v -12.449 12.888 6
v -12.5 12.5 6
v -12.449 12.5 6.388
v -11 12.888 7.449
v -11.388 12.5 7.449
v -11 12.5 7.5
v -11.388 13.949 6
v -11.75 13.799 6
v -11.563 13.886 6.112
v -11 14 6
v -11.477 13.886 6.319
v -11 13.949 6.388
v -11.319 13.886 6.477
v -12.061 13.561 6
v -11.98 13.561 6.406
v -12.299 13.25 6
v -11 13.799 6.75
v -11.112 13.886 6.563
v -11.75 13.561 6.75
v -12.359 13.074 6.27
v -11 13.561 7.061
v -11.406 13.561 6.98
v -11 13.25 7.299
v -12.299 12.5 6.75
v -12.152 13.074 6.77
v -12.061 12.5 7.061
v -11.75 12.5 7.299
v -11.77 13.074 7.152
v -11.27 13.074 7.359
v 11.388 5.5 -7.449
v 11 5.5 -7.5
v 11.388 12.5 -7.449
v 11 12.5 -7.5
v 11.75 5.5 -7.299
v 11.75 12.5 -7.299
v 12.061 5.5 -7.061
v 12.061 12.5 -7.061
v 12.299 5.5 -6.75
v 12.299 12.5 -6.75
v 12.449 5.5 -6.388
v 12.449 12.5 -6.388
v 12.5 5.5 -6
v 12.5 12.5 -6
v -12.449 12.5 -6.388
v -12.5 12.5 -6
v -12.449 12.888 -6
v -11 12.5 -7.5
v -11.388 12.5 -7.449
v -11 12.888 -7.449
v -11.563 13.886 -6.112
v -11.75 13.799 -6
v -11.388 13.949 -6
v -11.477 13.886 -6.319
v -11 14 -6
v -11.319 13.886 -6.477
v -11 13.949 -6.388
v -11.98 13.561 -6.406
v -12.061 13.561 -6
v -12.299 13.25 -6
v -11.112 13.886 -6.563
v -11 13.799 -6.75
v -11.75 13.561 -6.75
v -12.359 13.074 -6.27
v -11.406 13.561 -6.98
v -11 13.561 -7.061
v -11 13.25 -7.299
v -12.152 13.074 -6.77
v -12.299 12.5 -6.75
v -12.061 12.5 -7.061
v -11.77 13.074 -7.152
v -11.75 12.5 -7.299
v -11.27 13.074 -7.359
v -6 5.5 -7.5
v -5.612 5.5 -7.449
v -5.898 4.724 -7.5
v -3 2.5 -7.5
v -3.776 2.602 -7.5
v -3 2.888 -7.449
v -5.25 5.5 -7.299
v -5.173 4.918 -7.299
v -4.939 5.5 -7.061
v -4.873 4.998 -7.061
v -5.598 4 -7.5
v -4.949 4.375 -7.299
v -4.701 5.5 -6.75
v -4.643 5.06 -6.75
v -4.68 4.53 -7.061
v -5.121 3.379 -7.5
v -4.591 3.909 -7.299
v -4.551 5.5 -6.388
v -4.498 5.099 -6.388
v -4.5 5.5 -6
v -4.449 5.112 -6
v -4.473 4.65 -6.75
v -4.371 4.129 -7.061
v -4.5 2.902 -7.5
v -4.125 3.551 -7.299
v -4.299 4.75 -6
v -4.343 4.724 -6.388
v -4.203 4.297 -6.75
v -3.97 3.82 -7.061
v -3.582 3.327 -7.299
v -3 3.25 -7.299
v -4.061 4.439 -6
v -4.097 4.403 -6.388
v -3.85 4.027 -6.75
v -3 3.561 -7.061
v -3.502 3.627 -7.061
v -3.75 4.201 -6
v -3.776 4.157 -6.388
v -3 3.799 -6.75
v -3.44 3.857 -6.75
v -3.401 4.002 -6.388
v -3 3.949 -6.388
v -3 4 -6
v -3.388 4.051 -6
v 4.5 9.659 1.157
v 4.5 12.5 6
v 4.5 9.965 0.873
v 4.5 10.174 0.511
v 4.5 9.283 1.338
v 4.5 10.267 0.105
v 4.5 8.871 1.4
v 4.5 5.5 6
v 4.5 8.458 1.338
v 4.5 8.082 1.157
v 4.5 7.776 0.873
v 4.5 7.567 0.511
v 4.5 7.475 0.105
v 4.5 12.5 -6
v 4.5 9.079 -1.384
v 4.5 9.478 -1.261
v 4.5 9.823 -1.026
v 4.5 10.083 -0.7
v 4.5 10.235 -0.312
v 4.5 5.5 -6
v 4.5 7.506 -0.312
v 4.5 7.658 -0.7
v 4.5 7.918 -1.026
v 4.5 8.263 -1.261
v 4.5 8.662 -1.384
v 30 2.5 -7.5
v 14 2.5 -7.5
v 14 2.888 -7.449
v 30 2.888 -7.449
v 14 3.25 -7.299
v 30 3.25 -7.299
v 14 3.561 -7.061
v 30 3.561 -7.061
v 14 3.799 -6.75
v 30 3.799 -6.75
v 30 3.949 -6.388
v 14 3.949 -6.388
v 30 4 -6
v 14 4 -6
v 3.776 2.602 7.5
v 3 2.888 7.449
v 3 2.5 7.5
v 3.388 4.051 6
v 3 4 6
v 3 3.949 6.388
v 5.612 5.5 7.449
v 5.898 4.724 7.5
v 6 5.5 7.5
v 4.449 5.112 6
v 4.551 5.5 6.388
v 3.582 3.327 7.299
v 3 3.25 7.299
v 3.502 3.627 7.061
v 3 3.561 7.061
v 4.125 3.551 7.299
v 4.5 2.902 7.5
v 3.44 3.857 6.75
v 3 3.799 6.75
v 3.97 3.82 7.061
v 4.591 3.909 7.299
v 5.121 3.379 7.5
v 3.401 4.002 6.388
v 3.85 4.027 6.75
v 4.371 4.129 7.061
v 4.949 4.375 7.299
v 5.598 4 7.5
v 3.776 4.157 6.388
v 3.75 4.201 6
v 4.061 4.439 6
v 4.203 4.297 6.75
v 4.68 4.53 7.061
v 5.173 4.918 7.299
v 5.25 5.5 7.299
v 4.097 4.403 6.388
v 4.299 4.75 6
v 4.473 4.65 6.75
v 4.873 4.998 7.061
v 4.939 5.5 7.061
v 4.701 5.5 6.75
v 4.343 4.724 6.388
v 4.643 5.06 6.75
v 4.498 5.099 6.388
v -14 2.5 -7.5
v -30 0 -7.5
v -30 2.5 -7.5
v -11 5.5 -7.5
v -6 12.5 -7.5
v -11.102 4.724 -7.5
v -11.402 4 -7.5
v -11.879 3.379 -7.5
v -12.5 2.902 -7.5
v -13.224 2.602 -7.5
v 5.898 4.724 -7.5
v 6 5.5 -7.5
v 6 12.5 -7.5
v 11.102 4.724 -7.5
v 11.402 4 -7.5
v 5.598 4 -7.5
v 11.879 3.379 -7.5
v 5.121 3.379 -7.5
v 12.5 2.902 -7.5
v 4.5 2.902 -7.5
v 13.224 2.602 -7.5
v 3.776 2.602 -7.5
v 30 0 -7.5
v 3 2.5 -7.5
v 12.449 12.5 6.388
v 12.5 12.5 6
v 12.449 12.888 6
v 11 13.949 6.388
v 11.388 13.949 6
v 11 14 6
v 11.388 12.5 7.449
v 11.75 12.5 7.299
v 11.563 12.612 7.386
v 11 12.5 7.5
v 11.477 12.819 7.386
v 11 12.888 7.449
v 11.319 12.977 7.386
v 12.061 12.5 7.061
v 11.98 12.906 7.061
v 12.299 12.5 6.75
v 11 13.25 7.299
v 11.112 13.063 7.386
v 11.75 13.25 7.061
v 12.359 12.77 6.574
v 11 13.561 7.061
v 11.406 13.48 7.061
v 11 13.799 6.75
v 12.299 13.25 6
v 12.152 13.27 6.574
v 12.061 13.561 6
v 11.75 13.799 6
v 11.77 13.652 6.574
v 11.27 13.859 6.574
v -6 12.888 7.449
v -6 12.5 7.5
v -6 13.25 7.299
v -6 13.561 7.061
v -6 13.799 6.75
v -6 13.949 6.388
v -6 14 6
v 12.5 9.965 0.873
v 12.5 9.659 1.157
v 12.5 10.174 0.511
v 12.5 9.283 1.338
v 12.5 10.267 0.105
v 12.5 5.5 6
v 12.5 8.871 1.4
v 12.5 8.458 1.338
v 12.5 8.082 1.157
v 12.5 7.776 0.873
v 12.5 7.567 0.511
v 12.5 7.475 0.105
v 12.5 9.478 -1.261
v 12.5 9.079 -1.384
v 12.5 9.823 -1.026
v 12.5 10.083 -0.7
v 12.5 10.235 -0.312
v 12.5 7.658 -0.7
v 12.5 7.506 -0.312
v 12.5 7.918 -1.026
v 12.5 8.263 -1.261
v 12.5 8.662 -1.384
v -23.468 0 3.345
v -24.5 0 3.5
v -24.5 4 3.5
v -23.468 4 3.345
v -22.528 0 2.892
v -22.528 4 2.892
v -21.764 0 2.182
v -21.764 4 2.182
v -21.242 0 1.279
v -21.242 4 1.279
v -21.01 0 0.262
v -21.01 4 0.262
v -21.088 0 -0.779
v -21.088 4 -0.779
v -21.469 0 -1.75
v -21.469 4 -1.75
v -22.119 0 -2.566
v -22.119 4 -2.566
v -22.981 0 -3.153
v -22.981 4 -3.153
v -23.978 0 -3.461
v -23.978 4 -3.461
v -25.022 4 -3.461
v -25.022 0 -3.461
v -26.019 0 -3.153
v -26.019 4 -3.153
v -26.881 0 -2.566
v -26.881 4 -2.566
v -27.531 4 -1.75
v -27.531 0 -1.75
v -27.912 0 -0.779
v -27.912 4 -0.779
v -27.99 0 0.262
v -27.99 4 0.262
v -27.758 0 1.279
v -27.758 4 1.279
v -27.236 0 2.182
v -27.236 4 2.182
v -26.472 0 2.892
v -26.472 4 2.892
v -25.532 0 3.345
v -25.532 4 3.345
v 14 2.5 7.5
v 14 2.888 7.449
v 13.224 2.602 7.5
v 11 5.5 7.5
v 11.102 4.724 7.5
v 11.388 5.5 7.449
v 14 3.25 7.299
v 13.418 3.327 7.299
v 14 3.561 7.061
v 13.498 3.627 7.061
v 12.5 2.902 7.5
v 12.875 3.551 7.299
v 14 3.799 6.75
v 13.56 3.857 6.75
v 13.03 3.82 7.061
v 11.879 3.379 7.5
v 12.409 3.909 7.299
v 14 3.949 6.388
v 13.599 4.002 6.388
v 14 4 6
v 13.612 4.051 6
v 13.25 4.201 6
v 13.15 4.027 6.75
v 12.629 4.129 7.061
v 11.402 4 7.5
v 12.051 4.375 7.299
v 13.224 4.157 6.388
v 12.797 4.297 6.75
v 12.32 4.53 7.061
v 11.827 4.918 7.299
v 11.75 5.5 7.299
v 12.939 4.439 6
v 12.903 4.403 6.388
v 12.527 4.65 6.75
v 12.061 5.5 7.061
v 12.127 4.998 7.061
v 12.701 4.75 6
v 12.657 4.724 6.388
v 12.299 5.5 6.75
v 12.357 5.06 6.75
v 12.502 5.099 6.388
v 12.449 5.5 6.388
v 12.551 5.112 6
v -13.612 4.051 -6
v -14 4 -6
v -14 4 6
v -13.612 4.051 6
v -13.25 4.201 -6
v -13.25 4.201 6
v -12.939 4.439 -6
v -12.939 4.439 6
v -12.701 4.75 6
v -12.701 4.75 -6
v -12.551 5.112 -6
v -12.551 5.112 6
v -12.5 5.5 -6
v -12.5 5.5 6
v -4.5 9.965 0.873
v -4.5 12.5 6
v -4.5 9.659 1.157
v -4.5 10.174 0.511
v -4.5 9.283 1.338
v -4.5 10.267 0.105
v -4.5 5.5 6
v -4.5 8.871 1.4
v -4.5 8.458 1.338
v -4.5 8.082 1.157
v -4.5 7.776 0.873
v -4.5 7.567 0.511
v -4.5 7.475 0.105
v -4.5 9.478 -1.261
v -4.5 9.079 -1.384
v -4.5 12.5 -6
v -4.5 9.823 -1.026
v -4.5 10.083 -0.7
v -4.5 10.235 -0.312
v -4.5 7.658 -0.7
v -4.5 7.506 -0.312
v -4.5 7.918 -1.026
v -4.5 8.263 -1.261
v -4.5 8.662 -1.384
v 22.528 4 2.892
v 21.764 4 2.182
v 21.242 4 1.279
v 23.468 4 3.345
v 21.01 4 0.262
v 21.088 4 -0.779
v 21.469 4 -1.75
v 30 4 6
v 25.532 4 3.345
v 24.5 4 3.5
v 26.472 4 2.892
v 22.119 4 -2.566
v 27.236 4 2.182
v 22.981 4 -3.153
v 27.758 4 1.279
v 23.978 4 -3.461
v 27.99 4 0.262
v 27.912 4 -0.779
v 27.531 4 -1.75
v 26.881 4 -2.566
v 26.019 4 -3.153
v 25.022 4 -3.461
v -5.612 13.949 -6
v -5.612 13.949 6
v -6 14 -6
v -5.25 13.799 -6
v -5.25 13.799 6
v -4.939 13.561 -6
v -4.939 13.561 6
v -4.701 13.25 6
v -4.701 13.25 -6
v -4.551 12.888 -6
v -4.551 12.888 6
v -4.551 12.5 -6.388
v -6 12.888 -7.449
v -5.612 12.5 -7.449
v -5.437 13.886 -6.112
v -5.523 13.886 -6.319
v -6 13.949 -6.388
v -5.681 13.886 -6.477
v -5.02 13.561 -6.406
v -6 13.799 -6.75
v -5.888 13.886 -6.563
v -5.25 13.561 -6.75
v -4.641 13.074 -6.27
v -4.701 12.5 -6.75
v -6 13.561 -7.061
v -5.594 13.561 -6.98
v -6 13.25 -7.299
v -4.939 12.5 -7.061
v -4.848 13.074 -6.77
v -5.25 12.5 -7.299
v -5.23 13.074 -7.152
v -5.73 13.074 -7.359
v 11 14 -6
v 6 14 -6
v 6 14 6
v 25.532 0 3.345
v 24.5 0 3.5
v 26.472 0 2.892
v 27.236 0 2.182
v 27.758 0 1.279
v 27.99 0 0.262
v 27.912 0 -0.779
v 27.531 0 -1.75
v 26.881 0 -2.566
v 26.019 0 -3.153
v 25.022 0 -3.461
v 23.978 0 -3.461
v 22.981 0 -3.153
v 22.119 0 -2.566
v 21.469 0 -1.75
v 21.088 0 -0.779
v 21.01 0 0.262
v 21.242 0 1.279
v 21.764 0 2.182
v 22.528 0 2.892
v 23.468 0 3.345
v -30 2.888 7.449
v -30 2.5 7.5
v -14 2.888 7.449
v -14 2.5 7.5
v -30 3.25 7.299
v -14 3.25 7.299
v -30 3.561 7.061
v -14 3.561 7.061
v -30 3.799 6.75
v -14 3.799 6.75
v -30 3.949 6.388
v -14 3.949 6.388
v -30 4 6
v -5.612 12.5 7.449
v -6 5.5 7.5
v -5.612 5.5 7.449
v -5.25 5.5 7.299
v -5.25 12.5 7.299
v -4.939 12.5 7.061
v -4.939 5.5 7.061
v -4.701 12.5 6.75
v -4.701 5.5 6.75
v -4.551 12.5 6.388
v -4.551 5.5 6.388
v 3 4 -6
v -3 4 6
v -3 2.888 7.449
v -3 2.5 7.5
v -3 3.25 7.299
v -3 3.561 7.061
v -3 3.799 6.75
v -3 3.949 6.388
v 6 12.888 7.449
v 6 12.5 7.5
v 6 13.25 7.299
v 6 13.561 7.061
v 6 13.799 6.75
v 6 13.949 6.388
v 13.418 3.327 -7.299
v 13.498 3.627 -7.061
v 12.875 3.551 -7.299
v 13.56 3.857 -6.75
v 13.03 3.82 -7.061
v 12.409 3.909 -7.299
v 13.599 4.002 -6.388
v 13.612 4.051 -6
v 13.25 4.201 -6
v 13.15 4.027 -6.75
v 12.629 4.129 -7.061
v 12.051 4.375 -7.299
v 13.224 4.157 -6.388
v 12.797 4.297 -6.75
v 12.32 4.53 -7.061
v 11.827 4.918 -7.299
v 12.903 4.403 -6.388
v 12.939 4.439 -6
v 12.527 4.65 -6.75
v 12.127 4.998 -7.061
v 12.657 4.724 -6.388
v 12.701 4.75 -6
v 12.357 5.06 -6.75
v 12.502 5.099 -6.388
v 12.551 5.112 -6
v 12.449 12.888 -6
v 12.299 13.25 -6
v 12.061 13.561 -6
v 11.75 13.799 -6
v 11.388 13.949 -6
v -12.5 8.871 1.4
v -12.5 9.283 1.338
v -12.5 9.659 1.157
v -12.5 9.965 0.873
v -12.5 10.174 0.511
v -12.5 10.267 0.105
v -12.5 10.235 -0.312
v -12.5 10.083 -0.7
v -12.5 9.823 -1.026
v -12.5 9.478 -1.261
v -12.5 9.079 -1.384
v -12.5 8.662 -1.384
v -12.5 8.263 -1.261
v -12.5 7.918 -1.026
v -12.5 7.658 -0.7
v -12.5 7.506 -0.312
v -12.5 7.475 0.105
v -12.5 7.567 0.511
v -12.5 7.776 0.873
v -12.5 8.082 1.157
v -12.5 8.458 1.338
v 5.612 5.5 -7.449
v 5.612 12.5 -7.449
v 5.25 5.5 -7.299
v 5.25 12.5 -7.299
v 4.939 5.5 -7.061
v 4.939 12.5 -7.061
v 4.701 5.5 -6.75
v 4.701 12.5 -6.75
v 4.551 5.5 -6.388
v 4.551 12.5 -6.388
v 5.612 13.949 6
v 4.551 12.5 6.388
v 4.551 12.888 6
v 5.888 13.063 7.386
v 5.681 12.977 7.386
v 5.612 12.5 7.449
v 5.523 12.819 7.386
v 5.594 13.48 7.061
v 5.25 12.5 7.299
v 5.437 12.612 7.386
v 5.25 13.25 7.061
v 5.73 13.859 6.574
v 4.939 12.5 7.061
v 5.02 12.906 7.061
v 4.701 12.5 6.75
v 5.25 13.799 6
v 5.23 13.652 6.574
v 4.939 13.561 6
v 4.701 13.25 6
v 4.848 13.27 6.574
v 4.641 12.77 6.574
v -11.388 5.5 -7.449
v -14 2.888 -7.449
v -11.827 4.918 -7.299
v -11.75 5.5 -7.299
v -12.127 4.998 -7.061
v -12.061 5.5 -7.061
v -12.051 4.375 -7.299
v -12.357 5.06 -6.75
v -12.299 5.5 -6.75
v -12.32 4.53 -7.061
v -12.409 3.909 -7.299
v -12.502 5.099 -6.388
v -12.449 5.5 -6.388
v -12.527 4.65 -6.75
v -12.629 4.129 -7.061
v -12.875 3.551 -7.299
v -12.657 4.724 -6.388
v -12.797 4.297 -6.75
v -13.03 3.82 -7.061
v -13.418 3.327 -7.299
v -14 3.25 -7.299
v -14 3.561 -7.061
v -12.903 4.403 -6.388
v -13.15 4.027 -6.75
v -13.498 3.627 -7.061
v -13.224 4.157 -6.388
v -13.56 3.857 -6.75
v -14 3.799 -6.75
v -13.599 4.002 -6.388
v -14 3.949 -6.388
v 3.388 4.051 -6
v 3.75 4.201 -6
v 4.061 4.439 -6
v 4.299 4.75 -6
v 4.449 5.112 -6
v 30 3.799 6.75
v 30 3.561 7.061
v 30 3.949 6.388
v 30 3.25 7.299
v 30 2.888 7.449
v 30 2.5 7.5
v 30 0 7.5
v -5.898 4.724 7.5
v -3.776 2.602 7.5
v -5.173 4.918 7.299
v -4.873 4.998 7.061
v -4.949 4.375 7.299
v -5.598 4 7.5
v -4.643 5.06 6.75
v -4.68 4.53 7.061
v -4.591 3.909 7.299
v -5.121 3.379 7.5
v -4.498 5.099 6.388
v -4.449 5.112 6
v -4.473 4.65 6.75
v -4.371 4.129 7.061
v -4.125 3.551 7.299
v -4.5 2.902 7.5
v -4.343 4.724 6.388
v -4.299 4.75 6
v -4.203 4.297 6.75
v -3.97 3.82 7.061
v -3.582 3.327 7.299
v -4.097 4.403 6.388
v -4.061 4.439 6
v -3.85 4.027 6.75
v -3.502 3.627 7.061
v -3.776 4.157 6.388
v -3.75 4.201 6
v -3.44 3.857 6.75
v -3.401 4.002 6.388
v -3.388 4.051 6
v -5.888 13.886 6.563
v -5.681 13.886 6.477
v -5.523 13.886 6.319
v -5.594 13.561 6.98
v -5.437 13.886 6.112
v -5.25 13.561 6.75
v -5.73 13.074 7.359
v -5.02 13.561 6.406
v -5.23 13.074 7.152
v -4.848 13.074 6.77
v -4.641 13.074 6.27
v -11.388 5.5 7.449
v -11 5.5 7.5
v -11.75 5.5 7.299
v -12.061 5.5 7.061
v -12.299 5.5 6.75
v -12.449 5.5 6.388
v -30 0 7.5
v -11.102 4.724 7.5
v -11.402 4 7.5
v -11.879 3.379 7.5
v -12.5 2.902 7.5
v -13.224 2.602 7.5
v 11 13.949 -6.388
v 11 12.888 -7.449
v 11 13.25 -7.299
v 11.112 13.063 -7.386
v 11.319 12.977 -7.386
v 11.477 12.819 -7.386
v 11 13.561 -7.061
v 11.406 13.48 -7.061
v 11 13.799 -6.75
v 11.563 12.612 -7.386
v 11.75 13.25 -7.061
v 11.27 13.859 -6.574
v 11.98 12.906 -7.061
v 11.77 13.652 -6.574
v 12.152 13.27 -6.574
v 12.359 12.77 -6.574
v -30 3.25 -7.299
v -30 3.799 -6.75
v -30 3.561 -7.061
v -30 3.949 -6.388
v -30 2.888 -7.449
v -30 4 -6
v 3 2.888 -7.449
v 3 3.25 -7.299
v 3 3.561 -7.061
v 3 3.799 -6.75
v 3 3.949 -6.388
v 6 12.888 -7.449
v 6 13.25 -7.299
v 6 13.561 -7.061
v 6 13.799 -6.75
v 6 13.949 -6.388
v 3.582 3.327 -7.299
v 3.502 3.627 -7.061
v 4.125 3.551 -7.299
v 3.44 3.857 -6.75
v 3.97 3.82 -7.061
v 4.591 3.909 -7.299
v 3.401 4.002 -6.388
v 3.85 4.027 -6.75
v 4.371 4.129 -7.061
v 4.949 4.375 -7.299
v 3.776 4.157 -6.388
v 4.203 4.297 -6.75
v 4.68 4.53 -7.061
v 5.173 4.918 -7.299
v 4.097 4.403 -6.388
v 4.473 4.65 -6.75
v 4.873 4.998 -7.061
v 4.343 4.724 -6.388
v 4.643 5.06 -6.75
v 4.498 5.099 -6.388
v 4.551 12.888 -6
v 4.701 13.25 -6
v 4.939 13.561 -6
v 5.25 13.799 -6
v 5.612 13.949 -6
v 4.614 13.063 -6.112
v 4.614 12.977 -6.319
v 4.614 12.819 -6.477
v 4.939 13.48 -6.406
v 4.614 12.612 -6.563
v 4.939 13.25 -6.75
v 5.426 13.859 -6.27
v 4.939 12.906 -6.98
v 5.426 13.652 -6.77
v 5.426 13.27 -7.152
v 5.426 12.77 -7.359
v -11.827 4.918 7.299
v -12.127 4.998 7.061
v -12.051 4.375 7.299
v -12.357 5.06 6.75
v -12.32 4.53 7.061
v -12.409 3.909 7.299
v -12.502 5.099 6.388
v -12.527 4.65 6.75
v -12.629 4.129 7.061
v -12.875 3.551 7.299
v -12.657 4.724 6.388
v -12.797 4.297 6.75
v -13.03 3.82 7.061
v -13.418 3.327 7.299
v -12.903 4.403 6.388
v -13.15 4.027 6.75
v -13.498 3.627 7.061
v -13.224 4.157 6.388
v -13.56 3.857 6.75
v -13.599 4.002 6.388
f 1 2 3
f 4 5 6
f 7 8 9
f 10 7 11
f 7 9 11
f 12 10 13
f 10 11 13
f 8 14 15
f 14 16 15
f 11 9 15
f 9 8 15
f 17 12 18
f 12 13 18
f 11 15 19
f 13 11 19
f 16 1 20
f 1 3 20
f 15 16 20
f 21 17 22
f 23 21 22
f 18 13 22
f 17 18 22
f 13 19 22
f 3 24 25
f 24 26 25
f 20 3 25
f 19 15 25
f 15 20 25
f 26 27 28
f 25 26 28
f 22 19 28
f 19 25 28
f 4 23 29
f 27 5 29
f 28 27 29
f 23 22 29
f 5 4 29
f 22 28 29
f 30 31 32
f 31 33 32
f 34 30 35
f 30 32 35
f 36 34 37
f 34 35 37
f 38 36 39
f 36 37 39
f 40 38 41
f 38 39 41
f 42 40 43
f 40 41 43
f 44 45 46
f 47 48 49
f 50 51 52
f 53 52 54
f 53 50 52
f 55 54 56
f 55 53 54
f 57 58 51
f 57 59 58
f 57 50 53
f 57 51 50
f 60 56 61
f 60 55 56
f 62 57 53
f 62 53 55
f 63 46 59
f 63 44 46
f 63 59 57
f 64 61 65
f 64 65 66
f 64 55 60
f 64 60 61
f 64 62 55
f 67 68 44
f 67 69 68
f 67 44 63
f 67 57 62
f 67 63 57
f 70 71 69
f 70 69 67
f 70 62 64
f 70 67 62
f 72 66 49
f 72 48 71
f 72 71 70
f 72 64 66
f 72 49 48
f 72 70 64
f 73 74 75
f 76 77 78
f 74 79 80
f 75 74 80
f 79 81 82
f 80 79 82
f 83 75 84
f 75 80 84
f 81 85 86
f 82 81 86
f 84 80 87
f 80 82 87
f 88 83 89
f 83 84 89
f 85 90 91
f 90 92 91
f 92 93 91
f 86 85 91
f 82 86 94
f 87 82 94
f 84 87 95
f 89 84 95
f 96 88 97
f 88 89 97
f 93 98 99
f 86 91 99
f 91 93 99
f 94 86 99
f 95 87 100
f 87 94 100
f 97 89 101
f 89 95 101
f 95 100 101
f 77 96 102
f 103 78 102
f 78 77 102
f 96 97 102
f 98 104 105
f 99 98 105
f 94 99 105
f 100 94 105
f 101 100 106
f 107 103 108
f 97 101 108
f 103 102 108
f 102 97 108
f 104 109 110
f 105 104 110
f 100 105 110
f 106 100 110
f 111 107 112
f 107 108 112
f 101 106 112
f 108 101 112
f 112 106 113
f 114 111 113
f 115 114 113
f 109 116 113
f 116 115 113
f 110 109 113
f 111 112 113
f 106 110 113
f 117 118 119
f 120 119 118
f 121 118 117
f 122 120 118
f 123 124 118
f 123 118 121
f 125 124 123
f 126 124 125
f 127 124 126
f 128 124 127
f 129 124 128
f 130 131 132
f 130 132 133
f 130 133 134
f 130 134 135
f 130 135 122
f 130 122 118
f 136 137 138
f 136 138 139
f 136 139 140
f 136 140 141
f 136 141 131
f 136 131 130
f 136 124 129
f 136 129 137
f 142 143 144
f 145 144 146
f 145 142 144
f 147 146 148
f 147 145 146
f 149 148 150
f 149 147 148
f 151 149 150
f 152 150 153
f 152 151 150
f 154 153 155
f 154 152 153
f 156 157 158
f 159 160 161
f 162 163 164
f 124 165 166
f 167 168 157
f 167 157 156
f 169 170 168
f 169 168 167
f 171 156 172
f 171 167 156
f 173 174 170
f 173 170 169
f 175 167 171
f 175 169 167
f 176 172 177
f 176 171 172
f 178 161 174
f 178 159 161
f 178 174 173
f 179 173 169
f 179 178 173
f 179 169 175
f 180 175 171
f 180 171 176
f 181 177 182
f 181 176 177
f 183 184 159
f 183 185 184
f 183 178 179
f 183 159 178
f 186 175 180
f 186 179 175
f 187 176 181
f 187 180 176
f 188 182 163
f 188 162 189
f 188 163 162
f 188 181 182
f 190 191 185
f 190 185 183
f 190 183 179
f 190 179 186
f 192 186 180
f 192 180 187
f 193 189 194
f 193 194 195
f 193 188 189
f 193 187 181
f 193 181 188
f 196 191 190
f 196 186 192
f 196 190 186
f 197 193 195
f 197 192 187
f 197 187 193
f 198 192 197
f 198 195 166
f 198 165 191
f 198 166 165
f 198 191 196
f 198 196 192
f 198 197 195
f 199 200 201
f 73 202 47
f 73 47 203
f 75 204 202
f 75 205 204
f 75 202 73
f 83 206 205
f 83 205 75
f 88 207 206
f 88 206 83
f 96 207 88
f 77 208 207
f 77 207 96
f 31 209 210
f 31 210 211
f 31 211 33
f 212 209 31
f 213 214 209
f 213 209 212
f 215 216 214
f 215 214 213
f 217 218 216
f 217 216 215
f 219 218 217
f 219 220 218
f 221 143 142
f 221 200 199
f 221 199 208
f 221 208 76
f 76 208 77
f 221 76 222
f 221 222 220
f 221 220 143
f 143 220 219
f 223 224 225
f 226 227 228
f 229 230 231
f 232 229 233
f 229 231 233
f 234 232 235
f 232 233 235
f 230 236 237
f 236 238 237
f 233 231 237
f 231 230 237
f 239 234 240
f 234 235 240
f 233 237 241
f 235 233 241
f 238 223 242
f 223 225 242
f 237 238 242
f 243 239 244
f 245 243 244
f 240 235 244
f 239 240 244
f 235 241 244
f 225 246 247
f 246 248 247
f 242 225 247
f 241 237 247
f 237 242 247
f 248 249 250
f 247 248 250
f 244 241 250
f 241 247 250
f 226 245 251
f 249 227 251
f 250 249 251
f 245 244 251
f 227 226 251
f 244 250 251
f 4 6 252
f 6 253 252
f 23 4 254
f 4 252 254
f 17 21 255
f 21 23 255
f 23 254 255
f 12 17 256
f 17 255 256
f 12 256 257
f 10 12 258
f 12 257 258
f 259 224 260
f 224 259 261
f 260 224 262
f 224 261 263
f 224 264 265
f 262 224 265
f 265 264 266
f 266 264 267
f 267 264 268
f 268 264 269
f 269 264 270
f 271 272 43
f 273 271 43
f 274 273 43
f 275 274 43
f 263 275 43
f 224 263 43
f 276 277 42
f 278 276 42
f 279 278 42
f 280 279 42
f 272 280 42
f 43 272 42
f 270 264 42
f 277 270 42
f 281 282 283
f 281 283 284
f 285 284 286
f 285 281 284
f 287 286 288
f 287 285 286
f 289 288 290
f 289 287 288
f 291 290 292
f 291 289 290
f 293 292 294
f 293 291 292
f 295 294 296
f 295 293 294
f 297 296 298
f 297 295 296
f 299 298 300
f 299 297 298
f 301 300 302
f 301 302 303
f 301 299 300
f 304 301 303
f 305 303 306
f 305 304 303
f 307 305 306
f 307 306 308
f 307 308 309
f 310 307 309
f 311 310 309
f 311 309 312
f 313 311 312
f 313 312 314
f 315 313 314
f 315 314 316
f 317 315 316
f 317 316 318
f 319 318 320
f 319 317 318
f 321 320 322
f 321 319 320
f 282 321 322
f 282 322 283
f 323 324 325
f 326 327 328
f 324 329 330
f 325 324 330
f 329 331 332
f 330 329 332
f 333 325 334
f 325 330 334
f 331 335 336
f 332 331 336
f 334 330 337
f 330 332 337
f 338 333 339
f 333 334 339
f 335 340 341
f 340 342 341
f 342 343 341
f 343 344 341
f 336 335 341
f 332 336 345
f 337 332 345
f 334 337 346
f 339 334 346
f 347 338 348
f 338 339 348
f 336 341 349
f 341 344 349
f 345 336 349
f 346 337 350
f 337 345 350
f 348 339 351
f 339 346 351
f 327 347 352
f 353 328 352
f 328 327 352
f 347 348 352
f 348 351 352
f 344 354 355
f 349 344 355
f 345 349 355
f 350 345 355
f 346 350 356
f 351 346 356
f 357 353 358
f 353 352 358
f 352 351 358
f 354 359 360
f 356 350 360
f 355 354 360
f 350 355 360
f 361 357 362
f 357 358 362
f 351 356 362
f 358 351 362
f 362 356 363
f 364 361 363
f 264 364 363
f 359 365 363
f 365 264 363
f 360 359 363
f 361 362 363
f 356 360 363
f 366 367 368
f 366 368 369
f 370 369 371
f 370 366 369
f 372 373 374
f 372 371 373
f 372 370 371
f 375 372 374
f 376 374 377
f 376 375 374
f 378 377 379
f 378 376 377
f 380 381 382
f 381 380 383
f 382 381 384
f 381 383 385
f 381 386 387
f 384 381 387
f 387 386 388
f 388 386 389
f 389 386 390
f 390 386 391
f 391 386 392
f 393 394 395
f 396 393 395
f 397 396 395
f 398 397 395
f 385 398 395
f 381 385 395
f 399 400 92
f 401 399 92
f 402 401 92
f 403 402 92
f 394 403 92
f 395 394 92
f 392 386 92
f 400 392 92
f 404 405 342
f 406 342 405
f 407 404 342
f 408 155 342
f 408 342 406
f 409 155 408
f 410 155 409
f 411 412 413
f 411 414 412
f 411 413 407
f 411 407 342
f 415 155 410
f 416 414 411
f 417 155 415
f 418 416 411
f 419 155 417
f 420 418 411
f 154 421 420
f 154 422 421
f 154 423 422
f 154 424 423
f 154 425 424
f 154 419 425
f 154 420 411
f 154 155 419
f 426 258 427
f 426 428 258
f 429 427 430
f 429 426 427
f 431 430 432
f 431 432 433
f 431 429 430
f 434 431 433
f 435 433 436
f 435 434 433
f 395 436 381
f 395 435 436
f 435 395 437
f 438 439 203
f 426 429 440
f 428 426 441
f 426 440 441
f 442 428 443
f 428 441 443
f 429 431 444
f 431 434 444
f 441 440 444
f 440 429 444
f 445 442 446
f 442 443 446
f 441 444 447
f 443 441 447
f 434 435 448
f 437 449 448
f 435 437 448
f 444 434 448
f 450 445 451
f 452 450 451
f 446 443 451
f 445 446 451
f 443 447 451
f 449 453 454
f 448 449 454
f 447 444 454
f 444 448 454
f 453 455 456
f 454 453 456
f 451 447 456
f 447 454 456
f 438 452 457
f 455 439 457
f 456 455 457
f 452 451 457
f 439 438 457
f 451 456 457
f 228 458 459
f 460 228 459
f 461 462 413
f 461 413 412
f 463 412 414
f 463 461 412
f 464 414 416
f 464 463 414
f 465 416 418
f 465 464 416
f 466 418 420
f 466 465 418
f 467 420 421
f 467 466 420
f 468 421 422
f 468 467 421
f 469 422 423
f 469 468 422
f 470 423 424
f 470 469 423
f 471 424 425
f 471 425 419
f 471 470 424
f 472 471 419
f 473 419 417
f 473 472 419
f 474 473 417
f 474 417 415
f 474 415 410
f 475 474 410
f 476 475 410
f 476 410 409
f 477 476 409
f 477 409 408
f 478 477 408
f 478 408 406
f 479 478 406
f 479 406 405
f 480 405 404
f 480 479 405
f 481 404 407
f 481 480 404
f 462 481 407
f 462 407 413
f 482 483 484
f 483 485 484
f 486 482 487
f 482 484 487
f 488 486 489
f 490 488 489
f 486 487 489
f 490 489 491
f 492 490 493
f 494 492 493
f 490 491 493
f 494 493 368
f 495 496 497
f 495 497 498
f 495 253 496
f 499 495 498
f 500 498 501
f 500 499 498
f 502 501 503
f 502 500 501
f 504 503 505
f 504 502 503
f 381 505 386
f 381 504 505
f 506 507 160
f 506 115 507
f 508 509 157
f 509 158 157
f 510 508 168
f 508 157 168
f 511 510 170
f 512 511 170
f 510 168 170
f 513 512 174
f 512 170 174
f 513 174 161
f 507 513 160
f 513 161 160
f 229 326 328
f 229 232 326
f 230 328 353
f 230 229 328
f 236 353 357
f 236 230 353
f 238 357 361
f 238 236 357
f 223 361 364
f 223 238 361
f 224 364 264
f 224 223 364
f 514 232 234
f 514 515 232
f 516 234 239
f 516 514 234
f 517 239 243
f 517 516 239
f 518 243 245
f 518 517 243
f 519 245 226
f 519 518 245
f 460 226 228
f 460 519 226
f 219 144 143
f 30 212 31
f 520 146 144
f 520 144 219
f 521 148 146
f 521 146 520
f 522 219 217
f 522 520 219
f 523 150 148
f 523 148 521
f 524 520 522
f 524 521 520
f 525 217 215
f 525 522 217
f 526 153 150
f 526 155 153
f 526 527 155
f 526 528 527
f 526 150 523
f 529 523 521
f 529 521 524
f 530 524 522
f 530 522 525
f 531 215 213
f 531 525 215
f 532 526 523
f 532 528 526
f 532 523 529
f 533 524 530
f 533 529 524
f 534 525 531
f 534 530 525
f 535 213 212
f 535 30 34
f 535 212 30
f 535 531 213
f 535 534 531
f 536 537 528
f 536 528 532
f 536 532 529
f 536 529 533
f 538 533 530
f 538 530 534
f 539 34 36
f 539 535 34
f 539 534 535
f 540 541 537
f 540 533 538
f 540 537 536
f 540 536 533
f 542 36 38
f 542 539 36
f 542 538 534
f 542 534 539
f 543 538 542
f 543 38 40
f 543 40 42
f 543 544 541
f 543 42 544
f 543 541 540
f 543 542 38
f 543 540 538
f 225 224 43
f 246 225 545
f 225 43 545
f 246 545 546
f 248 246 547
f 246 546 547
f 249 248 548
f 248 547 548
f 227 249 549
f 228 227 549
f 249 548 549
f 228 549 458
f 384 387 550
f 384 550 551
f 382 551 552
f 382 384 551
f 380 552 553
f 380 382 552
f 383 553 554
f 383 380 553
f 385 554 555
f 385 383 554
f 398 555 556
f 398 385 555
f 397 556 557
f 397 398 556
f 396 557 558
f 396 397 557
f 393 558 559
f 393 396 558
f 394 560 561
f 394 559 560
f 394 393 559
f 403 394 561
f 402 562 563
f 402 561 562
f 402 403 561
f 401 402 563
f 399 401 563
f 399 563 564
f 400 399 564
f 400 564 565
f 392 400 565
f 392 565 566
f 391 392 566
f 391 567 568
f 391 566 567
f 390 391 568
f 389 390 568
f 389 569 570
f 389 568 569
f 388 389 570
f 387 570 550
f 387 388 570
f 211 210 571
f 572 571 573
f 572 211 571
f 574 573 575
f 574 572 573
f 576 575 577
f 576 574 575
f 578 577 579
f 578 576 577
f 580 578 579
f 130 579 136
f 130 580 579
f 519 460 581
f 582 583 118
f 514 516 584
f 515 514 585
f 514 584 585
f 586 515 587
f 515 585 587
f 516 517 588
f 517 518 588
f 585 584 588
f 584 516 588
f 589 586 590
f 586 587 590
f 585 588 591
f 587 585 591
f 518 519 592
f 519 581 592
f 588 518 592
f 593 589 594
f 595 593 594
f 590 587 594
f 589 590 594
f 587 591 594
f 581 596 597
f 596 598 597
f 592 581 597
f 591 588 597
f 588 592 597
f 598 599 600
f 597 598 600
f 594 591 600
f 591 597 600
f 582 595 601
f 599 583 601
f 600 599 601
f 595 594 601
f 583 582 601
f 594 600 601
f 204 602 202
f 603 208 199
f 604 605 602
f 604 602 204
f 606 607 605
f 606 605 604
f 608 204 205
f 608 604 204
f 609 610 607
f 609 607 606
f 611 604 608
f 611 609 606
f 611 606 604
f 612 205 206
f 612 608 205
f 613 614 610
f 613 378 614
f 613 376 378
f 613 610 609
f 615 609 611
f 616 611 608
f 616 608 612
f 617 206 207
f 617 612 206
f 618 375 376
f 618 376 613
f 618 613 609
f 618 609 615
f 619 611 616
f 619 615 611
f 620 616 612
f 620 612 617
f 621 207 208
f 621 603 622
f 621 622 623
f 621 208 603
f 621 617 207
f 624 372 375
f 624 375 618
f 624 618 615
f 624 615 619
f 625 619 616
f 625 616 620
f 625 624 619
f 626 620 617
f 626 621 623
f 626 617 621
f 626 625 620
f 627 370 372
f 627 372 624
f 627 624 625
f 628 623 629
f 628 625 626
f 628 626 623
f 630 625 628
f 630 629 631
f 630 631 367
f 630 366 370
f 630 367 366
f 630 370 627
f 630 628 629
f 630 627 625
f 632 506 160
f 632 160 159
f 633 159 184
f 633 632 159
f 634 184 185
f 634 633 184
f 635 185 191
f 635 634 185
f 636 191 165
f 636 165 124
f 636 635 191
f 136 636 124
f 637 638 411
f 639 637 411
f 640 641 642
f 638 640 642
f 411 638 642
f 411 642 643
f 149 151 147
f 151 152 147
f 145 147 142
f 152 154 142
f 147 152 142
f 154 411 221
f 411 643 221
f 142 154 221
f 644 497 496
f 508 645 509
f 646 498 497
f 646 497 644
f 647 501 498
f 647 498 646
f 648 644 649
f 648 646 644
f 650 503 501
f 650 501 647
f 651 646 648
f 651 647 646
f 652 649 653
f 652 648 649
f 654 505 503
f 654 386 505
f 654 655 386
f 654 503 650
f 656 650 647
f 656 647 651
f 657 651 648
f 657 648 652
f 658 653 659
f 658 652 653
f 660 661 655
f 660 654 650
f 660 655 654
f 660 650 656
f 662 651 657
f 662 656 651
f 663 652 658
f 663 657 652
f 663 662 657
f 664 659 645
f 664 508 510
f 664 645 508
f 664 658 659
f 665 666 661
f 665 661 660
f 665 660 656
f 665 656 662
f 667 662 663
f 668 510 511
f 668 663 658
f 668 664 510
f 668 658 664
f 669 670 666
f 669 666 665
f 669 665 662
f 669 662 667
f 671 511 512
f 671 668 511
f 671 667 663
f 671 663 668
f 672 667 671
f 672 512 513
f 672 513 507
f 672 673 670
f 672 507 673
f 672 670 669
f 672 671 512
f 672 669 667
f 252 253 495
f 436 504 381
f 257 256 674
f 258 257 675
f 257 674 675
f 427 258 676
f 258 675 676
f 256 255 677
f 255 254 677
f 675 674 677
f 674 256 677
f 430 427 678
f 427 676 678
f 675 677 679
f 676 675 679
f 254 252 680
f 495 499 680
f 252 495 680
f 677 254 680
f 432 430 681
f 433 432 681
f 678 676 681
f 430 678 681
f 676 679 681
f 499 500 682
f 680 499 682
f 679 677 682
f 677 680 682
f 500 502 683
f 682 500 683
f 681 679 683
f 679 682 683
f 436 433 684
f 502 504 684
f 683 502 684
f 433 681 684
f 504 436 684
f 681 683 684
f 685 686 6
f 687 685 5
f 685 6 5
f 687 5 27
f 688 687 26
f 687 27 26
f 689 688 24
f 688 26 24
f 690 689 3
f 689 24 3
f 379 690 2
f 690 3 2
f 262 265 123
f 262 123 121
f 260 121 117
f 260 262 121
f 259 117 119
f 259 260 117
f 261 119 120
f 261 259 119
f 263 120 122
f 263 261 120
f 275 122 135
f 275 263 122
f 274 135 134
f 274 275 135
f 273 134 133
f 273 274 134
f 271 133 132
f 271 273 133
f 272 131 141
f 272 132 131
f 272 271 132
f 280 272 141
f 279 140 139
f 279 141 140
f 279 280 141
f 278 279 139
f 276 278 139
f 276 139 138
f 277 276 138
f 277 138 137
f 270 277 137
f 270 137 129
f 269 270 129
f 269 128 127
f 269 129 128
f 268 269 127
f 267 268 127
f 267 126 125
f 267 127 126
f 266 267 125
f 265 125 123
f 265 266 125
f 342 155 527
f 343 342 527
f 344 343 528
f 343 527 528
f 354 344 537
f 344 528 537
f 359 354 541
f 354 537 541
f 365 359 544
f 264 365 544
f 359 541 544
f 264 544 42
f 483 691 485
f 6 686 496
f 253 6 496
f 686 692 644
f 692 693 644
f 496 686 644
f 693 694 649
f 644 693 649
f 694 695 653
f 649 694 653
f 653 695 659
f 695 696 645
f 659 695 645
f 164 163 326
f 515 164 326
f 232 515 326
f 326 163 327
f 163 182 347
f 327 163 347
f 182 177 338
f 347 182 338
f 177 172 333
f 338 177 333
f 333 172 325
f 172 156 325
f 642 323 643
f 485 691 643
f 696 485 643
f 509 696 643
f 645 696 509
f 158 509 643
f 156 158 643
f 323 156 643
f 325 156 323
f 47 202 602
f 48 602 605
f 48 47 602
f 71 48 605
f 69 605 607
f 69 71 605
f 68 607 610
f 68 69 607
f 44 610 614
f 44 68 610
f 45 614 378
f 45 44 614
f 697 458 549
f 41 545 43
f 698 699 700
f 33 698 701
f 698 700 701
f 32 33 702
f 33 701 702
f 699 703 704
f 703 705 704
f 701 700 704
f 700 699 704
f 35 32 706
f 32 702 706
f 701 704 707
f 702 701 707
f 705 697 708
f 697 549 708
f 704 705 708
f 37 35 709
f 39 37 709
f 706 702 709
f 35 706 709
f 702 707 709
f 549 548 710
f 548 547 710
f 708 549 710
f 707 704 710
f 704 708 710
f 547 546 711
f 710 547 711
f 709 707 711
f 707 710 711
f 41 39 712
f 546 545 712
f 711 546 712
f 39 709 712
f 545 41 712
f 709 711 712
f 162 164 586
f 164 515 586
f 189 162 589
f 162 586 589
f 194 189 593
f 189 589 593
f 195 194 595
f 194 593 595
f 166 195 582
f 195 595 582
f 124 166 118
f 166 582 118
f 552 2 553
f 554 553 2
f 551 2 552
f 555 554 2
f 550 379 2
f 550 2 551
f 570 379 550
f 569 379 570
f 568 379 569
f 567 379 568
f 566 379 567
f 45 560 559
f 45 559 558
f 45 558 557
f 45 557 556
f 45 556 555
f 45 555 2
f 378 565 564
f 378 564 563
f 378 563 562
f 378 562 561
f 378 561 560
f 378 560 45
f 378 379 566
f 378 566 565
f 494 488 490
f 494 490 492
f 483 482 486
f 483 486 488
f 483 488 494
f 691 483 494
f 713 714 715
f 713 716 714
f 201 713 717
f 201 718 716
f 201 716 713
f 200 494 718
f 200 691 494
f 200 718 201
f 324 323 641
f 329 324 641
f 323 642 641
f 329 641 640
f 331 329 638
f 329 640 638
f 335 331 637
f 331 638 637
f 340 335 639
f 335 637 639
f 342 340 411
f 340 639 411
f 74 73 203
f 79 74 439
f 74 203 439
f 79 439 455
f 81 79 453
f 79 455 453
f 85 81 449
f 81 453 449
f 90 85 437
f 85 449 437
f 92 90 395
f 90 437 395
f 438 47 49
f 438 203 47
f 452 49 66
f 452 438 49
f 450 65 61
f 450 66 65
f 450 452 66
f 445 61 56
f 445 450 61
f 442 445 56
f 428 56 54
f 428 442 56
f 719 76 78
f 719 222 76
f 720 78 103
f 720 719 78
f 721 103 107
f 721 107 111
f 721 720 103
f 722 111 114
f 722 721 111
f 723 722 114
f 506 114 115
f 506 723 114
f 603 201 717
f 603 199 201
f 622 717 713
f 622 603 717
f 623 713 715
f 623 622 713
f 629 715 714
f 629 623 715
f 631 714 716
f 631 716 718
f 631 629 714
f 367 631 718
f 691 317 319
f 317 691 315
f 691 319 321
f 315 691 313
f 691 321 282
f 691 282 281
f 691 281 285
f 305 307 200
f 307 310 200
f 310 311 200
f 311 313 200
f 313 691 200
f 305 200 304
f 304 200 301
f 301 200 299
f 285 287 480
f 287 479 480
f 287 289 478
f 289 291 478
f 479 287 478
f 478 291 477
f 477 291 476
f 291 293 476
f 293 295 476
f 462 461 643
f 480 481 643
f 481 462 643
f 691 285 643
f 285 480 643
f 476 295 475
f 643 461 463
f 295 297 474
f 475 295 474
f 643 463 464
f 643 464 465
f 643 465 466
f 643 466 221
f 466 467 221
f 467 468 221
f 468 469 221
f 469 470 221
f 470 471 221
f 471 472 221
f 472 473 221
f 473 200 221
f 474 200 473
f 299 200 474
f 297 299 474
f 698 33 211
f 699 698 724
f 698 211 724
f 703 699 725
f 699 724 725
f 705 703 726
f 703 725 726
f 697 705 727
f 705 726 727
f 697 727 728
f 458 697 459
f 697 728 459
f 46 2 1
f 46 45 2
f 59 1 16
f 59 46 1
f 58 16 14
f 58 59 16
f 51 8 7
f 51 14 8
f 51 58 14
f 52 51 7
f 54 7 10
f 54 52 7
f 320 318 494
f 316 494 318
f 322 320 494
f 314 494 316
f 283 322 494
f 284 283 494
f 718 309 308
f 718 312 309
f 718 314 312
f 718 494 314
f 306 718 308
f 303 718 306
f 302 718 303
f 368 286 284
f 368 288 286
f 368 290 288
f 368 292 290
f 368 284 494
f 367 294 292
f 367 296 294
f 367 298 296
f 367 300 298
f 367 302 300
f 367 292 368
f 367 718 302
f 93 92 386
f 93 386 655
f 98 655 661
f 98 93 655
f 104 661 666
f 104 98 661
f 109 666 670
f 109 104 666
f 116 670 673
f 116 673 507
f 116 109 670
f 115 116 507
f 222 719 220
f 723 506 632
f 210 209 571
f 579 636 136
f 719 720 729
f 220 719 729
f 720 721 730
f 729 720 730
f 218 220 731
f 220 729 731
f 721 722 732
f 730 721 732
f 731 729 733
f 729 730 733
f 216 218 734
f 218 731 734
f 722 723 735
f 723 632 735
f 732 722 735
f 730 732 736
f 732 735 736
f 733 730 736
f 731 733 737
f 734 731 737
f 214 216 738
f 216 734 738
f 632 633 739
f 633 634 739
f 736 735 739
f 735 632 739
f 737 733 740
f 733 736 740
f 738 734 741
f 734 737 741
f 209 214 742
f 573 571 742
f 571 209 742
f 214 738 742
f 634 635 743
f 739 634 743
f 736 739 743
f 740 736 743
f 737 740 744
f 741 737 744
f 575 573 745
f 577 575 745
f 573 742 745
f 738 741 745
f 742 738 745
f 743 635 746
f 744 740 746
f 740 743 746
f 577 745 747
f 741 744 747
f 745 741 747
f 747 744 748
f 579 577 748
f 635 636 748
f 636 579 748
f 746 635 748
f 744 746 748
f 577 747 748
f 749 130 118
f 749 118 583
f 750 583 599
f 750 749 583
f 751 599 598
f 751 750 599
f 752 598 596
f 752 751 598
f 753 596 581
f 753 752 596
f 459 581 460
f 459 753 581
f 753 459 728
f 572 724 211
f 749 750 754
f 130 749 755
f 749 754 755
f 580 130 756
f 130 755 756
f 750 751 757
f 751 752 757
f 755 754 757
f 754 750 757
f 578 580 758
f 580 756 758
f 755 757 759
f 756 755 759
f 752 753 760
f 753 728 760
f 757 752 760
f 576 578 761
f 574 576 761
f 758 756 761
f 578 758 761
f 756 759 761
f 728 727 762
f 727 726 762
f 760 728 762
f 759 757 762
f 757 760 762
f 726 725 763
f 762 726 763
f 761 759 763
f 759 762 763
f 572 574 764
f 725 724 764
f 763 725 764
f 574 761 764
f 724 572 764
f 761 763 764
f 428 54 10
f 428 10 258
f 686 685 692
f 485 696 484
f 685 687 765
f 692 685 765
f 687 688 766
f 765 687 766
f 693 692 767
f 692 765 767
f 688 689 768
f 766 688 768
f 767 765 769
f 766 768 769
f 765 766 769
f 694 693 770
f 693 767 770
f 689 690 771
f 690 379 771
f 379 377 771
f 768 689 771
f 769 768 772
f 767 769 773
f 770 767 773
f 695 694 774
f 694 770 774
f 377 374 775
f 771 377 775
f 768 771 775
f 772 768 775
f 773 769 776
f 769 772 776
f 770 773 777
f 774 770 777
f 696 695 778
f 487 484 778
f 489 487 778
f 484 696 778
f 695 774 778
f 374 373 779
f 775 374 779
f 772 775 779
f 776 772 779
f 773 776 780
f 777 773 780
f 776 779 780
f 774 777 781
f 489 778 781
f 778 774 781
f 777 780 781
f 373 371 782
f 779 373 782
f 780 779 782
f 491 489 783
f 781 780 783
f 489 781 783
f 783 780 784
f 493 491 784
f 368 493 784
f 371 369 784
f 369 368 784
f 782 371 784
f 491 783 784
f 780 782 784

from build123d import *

# Parameters (mm, degrees)
SKETCH3_W               = 60
SKETCH3_H               = 15
SKETCH3_R               = 3.5
BOSS_EXTRUDE1_DEPTH     = 4
SKETCH6_W               = 8
SKETCH6_H               = 15
BOSS_EXTRUDE2_DEPTH     = 10
FILLET2_R               = 1.5
CUT_EXTRUDE1_DEPTH      = 46.370695388
CUT_EXTRUDE1_DEPTH_BACK = 46.370695388
SKETCH7_R               = 1.4


with BuildPart() as part:
    # Sketch3 → Boss-Extrude1 (new body)
    with BuildSketch(Plane(origin=(0, 0, 0), x_dir=(1, 0, 0), z_dir=(0, 1, 0))):
        Rectangle(SKETCH3_W, SKETCH3_H)
        with Locations(Location((-24.5, 0, 0), (0, 0, 270))):
            Circle(SKETCH3_R, mode=Mode.SUBTRACT)
        with Locations(Location((24.5, 0, 0), (0, 0, 270))):
            Circle(SKETCH3_R, mode=Mode.SUBTRACT)
    extrude(amount=BOSS_EXTRUDE1_DEPTH)

    # Sketch6 → Boss-Extrude2 (add)
    with BuildSketch(Plane(origin=(0, 4, 0), x_dir=(1, 0, 0), z_dir=(0, 1, 0))):
        with Locations((-8.5, 0)):
            Rectangle(SKETCH6_W, SKETCH6_H)
    boss_extrude2 = extrude(amount=BOSS_EXTRUDE2_DEPTH)

    # Mirror1: Boss-Extrude2 across plane
    add(boss_extrude2.mirror(Plane(origin=(0, 0, 0), x_dir=(0, 0, 1), z_dir=(1, 0, 0))))

    # Fillet2
    fillet2_edges = [part.edges().sort_by_distance(p)[0] for p in [
        (-21.25, 4, 7.5),
        (-21.25, 4, -7.5),
        (0, 4, 7.5),
        (-12.5, 4, 0),
        (-12.5, 9, -7.5),
        (-12.5, 9, 7.5),
        (-4.5, 4, 0),
        (-4.5, 9, 7.5),
        (-4.5, 9, -7.5),
        (-12.5, 14, 0),
        (-8.5, 14, 7.5),
        (-4.5, 14, 0),
        (-8.5, 14, -7.5),
        (21.25, 4, 7.5),
        (0, 4, -7.5),
        (12.5, 14, 0),
        (12.5, 9, 7.5),
        (8.5, 14, -7.5),
        (12.5, 9, -7.5),
        (4.5, 14, 0),
        (4.5, 9, -7.5),
        (8.5, 14, 7.5),
        (4.5, 9, 7.5),
        (12.5, 4, 0),
        (4.5, 4, 0),
        (21.25, 4, -7.5),
    ]]
    fillet(fillet2_edges, radius=FILLET2_R)

    # Sketch7 → Cut-Extrude1 (cut, two sides: drawn at the far end of the back side and taken through both)
    with BuildSketch(Plane.ZY.offset(12.5).offset(-CUT_EXTRUDE1_DEPTH_BACK)):
        with Locations((0, 8.870600297)):
            Circle(SKETCH7_R)
    extrude(amount=CUT_EXTRUDE1_DEPTH + CUT_EXTRUDE1_DEPTH_BACK, mode=Mode.SUBTRACT)


solid = part.part
